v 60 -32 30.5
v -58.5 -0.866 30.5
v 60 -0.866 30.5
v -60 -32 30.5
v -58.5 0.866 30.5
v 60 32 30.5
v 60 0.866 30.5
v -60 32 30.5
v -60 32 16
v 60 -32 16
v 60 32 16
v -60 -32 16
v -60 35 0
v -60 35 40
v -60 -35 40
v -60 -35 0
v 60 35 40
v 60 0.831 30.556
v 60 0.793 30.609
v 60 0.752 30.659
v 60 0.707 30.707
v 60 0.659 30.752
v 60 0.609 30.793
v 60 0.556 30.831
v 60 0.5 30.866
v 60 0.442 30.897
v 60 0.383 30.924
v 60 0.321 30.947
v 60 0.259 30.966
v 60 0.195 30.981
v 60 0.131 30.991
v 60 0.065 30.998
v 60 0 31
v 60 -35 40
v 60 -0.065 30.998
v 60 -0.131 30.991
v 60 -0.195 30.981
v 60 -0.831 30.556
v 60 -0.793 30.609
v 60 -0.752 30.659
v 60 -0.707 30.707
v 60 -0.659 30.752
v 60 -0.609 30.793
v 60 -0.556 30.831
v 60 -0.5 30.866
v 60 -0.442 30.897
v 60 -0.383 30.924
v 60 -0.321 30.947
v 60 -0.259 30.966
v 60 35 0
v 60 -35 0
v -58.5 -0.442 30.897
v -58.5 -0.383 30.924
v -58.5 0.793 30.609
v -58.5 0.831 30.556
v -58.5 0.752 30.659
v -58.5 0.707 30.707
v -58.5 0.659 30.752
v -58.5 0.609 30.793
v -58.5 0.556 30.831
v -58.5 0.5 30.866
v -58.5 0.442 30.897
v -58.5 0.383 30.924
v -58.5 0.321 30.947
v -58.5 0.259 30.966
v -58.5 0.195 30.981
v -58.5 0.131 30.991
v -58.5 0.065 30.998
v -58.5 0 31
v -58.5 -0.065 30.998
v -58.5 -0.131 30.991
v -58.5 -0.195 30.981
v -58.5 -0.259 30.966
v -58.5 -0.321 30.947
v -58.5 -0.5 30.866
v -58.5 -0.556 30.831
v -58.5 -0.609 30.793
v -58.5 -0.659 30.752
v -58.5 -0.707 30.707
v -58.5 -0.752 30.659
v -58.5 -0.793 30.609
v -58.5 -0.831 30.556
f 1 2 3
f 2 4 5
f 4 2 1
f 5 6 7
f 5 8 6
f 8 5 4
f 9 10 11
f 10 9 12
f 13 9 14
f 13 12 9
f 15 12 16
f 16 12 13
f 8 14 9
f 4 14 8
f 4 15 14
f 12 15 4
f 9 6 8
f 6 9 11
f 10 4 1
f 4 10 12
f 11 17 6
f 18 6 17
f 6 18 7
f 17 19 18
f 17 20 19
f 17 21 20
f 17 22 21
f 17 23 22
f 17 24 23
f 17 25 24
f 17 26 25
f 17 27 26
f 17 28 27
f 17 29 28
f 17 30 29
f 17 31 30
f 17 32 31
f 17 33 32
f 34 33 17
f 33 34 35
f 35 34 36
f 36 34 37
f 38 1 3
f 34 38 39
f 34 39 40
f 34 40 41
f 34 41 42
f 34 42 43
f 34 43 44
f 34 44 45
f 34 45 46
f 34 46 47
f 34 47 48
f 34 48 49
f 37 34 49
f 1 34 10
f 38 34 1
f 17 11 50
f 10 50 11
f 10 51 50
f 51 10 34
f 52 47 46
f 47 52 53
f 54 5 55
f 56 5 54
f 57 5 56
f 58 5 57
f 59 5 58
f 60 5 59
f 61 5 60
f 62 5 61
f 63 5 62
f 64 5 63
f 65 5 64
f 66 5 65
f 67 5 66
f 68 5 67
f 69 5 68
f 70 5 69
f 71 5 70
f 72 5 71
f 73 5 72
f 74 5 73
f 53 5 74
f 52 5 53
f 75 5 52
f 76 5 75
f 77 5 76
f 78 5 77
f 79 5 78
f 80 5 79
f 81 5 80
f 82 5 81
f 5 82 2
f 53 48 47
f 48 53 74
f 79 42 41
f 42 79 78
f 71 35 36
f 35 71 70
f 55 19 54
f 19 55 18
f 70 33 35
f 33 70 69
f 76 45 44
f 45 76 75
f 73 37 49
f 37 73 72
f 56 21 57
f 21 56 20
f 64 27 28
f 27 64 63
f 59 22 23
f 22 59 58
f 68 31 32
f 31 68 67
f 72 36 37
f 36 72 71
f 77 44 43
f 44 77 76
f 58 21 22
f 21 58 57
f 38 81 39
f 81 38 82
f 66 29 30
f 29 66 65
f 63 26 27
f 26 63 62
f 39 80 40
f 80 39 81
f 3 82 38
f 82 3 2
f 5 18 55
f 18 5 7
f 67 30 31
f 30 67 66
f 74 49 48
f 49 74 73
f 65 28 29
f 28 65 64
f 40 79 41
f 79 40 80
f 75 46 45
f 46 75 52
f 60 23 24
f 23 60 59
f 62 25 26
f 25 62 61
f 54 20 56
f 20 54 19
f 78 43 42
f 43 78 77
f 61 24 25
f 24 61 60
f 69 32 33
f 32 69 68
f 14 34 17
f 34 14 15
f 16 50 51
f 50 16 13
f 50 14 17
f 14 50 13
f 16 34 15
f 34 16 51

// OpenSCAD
// Mini horizontal gel-electrophoresis box - buffer tank
// Print orientation: tank rests on XY plane at z = 0, builds upward (+Z)

// ---------------- Parameters ----------------
tank_x      = 120;   // outer length along X (mm)
tank_y      = 70;    // outer width along Y (mm)
tank_h      = 40;    // outer height along Z (mm)
wall        = 3;     // wall thickness (mm)
floor       = 3;     // floor thickness (mm)

platform_x  = 60;    // platform length along X (mm), centred
platform_y  = tank_y - 2 * wall;  // platform spans full inner width (mm)
platform_top = 13;   // platform top height above inner floor (mm) -> z = floor + platform_top

hole_d      = 2;     // electrode hole diameter (mm)
hole_y      = 0;     // electrode hole Y position (mm)
hole_z      = 30;    // electrode hole Z position (mm)

eps         = 0.5;   // cutter overshoot past faces (mm)
$fn         = 96;    // curve resolution

// ---------------- Derived ----------------
inner_floor_z = floor;
platform_z    = inner_floor_z + platform_top;
chamber_h     = hole_z - platform_z;   // height of buffer chambers above platform

// ---------------- Model ----------------
difference() {
    // Tank body: outer block with floor and walls, open top
    translate([-tank_x/2, -tank_y/2, 0])
        cube([tank_x, tank_y, tank_h]);

    // Cut out the two end buffer chambers above the platform
    for (sx = [-1, 1]) {
        translate([sx > 0 ? tank_x/2 - platform_x : -tank_x/2, -platform_y/2, platform_z])
            cube([platform_x, platform_y, chamber_h + eps]);
    }

    // Horizontal electrode holes through each end wall, along X
    for (sx = [-1, 1]) {
        translate([sx * (tank_x/2 - hole_d/2 - eps), hole_y, hole_z])
            rotate([0, 90, 0])
                cylinder(d = hole_d, h = tank_x + 2*eps);
    }
}
